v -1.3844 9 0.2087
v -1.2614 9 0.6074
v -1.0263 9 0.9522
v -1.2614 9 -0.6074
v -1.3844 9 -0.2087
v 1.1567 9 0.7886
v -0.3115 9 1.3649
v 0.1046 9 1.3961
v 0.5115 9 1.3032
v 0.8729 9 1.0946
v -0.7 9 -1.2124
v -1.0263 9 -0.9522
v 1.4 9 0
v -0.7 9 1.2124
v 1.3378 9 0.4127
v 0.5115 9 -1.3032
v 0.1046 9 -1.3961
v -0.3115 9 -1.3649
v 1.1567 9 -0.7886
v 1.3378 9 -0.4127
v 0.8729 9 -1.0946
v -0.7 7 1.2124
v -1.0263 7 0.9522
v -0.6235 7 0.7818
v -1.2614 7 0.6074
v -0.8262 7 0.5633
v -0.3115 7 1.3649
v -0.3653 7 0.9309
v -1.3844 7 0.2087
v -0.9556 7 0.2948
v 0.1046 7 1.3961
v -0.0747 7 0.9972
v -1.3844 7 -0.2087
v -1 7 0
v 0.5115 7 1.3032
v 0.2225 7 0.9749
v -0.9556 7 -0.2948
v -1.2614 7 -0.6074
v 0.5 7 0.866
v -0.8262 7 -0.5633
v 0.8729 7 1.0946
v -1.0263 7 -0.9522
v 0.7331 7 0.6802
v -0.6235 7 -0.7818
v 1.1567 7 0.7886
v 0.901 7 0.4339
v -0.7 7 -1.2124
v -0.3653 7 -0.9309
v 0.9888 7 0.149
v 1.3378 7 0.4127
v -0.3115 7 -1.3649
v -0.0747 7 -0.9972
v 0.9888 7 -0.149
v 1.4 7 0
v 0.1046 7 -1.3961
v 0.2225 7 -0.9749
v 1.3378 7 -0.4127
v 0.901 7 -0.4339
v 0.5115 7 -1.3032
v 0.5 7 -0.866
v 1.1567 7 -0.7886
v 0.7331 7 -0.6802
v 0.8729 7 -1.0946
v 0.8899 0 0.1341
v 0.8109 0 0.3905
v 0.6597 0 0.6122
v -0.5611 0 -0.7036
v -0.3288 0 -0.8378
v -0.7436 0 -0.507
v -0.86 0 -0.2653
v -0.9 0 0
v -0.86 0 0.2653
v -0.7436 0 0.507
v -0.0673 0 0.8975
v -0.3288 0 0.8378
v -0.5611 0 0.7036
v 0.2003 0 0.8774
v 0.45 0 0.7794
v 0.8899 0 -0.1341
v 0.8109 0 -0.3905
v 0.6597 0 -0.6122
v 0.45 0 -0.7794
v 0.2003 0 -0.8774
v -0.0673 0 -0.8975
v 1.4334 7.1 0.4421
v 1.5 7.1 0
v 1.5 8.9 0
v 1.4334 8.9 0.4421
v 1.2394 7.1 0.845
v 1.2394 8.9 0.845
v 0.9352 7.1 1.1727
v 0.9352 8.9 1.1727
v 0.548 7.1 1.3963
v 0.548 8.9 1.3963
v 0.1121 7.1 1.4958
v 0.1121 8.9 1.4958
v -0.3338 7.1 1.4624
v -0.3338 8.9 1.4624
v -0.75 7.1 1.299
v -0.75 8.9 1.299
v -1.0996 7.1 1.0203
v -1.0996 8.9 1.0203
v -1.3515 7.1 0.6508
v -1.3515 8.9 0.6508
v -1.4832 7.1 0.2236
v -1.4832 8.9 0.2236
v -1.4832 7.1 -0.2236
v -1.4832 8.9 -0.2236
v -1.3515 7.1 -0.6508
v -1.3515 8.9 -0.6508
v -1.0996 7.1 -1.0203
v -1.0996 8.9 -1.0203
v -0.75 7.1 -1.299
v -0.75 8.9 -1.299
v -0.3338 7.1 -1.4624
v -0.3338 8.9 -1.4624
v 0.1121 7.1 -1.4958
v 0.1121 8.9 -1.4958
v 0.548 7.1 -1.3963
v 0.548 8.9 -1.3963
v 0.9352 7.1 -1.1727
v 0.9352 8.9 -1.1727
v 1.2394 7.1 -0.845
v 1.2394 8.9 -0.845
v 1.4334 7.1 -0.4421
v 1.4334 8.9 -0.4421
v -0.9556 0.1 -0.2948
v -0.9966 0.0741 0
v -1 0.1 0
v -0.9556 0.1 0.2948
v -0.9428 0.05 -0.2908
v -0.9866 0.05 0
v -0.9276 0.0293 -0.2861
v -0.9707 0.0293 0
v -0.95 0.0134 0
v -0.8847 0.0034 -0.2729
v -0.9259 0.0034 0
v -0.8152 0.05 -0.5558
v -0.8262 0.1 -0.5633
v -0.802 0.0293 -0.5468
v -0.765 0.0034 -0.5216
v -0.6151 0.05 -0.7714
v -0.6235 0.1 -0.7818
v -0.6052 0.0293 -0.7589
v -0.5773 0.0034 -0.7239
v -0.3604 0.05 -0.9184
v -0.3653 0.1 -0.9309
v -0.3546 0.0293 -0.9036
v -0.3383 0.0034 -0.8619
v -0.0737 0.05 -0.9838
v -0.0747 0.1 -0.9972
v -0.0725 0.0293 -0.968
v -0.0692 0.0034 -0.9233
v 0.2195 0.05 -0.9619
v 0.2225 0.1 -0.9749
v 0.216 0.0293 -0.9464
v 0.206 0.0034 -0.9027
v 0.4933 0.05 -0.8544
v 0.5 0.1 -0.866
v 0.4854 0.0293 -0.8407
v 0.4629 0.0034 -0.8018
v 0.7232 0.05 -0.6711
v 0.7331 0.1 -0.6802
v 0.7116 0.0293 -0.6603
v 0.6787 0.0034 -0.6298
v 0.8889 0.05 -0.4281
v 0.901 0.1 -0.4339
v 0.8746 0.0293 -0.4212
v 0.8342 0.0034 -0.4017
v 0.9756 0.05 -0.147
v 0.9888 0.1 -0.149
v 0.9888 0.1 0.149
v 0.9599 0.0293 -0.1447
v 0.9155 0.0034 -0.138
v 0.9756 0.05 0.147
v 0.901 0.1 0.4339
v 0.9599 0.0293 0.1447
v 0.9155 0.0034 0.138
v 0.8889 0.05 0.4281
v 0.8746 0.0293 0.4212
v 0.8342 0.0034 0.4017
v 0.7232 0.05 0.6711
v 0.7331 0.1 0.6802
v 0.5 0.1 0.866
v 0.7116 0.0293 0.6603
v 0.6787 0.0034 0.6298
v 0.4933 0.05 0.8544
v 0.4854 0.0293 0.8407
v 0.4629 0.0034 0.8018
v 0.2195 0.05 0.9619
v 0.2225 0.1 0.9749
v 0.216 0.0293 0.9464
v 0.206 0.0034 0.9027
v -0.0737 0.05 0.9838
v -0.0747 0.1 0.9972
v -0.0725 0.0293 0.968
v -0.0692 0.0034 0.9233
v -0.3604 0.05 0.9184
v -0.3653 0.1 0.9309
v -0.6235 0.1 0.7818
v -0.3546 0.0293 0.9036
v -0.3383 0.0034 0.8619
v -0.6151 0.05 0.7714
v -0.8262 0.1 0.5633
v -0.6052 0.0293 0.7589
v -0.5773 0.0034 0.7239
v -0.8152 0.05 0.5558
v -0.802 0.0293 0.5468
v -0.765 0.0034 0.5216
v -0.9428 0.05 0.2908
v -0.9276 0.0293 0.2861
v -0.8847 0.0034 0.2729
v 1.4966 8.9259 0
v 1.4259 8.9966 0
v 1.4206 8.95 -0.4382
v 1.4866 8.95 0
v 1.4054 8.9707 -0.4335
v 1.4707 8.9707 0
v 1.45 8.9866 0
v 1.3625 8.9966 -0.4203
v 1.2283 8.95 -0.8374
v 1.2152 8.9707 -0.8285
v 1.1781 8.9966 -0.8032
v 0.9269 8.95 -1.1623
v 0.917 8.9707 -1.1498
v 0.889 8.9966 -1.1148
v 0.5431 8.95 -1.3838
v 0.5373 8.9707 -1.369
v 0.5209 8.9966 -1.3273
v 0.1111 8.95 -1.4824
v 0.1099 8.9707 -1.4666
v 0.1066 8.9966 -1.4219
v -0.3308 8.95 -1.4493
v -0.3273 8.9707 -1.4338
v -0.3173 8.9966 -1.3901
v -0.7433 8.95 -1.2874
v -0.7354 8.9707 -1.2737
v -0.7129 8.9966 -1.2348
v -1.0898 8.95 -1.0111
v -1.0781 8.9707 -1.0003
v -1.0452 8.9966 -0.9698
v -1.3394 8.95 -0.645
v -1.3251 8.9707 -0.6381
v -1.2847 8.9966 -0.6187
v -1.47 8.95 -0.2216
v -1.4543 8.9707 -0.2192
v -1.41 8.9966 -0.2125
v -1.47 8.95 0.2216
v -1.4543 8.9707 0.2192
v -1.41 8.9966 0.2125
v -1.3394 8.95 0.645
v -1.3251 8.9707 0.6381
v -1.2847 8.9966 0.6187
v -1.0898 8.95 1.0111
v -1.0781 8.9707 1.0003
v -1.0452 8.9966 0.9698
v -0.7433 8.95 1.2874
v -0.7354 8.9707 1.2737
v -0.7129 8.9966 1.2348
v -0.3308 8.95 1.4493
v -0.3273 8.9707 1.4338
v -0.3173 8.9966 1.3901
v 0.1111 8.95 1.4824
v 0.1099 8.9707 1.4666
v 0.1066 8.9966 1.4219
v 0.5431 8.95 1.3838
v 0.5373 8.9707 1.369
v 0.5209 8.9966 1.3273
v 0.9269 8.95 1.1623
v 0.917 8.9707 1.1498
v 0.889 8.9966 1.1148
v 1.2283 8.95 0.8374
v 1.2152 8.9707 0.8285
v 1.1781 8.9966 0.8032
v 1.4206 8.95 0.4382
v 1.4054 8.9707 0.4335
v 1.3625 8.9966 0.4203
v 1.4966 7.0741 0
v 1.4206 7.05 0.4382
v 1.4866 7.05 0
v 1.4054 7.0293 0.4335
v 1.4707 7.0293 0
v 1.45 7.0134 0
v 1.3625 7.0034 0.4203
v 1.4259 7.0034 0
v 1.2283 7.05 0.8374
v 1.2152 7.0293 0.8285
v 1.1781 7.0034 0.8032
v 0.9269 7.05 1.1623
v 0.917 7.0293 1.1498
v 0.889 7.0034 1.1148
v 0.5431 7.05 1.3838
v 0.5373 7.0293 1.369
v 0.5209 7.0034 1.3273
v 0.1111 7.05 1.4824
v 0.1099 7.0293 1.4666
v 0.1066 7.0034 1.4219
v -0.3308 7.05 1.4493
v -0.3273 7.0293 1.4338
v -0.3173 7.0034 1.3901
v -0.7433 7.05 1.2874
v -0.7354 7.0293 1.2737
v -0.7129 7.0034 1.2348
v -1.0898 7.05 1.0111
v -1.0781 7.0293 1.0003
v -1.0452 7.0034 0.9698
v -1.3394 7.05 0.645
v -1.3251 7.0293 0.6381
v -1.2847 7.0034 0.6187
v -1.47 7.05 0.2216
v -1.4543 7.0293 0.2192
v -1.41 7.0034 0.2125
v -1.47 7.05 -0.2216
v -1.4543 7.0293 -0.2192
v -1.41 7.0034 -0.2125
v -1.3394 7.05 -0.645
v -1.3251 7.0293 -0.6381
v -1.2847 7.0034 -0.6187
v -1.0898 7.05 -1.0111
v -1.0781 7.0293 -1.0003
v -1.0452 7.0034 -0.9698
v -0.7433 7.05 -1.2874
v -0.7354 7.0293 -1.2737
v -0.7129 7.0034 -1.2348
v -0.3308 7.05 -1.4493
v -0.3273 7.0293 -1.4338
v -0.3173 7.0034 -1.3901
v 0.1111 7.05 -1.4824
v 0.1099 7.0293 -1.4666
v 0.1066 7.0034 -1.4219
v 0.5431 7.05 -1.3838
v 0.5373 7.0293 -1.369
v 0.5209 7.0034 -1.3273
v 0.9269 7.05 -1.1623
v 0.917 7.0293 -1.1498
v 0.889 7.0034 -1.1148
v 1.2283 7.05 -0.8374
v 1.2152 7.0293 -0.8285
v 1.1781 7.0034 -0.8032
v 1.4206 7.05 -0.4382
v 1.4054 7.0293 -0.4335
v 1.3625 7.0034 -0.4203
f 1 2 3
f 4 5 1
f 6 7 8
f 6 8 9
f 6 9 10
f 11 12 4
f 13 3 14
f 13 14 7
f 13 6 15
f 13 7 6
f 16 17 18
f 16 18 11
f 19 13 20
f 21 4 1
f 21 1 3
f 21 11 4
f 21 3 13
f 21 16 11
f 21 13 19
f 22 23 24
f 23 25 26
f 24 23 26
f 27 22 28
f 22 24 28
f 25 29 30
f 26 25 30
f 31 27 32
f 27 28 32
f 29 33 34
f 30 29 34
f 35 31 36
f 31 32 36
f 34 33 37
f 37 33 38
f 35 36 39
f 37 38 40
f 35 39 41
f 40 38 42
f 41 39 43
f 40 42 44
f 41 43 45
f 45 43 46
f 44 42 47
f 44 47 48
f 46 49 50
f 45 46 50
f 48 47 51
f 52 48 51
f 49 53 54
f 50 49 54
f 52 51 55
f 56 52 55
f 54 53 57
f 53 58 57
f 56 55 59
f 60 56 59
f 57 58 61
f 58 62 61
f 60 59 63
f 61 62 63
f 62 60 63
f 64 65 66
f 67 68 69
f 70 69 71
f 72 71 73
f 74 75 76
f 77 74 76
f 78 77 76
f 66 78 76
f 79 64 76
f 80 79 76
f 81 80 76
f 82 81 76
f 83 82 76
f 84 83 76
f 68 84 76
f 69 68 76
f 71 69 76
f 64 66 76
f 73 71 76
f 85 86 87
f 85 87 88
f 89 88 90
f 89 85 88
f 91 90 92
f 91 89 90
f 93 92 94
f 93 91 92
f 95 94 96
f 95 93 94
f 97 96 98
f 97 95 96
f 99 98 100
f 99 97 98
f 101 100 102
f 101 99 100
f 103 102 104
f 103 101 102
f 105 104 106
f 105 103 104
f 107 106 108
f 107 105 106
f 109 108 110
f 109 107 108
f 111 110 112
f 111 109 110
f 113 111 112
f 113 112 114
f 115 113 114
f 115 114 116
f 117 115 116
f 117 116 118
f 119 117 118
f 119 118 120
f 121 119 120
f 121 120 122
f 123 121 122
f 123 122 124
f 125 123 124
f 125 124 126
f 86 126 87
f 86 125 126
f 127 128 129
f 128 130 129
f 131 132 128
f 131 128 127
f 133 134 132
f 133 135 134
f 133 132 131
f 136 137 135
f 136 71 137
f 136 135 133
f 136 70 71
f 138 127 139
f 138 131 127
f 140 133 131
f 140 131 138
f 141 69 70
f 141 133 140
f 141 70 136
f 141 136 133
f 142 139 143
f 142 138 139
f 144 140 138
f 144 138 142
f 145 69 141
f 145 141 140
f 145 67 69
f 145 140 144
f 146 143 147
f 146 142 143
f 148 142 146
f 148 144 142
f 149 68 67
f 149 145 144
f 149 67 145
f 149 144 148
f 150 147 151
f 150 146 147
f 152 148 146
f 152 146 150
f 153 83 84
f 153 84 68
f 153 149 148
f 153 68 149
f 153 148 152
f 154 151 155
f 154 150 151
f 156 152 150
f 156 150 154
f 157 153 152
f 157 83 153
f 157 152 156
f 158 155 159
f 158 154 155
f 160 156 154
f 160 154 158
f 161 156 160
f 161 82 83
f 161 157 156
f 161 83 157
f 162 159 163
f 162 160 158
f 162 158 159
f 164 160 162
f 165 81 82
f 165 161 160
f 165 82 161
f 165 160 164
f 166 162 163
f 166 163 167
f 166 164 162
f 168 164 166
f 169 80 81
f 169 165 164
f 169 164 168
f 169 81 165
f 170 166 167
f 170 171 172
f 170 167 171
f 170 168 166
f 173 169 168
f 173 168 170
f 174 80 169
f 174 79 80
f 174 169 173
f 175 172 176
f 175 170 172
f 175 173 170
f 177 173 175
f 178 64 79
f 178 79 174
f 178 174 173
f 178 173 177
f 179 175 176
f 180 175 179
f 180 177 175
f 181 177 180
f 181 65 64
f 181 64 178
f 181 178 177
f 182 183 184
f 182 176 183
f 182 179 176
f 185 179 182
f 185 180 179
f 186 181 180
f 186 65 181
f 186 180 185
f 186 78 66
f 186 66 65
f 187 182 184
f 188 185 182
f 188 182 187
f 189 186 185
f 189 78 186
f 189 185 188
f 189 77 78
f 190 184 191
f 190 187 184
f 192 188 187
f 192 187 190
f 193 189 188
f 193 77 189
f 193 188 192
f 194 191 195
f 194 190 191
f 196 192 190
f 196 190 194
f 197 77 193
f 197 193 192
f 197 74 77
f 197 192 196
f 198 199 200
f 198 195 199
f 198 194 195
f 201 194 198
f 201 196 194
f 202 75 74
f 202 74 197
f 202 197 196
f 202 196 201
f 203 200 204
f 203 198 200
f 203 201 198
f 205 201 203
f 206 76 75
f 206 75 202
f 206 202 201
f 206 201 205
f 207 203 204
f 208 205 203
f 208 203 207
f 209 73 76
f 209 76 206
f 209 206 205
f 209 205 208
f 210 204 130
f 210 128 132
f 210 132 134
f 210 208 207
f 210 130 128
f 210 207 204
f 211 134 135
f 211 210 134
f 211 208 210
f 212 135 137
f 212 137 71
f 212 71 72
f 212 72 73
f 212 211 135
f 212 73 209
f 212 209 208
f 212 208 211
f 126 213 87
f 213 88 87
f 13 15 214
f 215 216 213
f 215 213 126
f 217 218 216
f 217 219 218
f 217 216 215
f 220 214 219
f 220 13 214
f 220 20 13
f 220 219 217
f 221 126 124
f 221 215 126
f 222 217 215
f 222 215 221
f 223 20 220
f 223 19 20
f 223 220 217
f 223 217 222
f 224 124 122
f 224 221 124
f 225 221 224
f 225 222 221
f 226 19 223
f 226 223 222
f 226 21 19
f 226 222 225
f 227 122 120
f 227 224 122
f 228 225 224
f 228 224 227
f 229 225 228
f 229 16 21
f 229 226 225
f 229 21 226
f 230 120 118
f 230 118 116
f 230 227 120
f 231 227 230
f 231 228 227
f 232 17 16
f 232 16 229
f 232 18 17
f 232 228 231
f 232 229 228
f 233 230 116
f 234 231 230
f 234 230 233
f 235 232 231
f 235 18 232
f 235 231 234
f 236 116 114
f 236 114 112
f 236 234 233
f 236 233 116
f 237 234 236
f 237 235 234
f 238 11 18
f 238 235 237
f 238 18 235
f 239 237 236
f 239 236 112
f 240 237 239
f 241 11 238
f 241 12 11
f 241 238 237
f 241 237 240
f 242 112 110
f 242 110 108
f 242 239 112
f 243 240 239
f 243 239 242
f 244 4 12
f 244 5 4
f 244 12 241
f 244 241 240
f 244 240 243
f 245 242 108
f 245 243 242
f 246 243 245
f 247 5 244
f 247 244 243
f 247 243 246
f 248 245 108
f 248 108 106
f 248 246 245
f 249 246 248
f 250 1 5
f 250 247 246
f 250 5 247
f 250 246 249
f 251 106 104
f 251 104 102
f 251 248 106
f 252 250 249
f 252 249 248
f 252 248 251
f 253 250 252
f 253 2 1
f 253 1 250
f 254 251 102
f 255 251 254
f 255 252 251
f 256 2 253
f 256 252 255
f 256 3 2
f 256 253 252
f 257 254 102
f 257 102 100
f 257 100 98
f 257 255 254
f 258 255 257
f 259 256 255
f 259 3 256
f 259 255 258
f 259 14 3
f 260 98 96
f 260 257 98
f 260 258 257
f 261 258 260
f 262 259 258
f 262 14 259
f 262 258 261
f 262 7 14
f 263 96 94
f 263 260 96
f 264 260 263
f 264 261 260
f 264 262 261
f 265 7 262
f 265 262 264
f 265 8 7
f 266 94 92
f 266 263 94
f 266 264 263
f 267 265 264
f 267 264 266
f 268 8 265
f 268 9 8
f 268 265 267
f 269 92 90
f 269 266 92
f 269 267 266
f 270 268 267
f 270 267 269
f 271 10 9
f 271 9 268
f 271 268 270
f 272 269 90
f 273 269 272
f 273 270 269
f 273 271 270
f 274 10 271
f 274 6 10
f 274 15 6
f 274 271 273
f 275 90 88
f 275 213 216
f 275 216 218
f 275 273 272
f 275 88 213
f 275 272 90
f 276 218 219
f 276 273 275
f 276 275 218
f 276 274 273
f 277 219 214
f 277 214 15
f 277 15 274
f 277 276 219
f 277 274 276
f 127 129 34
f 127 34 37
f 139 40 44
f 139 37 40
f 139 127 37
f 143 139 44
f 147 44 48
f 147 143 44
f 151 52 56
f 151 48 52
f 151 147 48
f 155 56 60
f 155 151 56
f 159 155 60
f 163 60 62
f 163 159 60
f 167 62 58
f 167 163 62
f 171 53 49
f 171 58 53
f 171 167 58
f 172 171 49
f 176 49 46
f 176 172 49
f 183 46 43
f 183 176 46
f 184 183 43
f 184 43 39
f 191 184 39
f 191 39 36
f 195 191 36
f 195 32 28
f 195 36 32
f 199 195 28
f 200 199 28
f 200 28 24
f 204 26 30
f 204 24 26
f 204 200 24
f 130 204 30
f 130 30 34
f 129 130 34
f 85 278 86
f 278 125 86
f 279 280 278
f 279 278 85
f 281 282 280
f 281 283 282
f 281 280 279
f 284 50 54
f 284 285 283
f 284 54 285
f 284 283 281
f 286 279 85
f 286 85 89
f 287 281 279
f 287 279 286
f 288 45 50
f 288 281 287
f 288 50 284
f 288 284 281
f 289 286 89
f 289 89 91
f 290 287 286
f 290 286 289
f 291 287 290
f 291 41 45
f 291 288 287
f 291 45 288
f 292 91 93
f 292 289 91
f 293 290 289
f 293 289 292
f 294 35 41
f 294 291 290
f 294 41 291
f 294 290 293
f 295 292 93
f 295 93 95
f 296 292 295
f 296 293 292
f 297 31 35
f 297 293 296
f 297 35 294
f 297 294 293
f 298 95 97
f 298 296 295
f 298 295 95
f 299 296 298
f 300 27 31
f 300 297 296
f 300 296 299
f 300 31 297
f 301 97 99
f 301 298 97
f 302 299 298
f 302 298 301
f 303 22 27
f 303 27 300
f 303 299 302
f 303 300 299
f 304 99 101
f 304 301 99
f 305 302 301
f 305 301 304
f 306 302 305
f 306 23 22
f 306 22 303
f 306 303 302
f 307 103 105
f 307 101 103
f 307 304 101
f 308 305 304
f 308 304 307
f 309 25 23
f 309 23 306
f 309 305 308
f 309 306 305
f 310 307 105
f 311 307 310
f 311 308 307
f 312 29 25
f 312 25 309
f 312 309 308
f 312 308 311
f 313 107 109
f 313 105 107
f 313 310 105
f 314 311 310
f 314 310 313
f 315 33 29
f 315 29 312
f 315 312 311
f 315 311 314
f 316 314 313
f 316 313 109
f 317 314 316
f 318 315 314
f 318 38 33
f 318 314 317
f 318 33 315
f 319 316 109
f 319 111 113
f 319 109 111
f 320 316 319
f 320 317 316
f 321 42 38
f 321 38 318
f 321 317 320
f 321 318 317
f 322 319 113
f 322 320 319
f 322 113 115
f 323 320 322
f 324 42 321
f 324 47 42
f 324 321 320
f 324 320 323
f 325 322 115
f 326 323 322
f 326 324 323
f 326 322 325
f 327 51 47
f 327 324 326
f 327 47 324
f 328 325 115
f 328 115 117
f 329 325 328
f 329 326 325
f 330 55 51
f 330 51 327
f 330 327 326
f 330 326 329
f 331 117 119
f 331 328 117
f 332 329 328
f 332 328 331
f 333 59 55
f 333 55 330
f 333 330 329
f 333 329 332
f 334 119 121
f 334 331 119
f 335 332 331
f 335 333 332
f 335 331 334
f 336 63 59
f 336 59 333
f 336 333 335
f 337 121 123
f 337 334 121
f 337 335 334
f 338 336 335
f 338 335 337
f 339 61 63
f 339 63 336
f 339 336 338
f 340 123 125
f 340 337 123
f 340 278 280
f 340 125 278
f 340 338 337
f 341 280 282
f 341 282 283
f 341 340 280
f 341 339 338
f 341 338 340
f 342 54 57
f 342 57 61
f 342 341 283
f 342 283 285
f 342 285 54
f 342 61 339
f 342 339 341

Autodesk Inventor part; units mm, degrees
ref_plane "YZ Plane" through (0, 0, 0) normal (1, 0, 0) x (0, 1, 0)
ref_plane "XZ Plane" through (0, 0, 0) normal (0, 1, 0) x (-1, 0, 0)
ref_plane "XY Plane" through (0, 0, 0) normal (0, 0, 1) x (1, 0, 0)
sketch "Boceto1" plane through (0, 0, 0) normal (0, 1, 0) x (-1, 0, 0)
  circle A0 centre (0, 0) radius 1
  dimension "d0" = 2
extrude "Extrusión1" add sketch "Boceto1" along normal blind 7
sketch "Boceto2" plane through (0, 7, 0) normal (0, 1, 0) x (1, 0, 0)
  circle A0 centre (0, 0) radius 1.5
  dimension "d3" = 3
extrude "Extrusión2" add sketch "Boceto2" along normal blind 2
fillet "Empalme1" radius 0.1 3 edges at (1, 0, 0) (-1.5, 7, 0) (-1.5, 9, 0)
properties part number "Tornillo 1"
